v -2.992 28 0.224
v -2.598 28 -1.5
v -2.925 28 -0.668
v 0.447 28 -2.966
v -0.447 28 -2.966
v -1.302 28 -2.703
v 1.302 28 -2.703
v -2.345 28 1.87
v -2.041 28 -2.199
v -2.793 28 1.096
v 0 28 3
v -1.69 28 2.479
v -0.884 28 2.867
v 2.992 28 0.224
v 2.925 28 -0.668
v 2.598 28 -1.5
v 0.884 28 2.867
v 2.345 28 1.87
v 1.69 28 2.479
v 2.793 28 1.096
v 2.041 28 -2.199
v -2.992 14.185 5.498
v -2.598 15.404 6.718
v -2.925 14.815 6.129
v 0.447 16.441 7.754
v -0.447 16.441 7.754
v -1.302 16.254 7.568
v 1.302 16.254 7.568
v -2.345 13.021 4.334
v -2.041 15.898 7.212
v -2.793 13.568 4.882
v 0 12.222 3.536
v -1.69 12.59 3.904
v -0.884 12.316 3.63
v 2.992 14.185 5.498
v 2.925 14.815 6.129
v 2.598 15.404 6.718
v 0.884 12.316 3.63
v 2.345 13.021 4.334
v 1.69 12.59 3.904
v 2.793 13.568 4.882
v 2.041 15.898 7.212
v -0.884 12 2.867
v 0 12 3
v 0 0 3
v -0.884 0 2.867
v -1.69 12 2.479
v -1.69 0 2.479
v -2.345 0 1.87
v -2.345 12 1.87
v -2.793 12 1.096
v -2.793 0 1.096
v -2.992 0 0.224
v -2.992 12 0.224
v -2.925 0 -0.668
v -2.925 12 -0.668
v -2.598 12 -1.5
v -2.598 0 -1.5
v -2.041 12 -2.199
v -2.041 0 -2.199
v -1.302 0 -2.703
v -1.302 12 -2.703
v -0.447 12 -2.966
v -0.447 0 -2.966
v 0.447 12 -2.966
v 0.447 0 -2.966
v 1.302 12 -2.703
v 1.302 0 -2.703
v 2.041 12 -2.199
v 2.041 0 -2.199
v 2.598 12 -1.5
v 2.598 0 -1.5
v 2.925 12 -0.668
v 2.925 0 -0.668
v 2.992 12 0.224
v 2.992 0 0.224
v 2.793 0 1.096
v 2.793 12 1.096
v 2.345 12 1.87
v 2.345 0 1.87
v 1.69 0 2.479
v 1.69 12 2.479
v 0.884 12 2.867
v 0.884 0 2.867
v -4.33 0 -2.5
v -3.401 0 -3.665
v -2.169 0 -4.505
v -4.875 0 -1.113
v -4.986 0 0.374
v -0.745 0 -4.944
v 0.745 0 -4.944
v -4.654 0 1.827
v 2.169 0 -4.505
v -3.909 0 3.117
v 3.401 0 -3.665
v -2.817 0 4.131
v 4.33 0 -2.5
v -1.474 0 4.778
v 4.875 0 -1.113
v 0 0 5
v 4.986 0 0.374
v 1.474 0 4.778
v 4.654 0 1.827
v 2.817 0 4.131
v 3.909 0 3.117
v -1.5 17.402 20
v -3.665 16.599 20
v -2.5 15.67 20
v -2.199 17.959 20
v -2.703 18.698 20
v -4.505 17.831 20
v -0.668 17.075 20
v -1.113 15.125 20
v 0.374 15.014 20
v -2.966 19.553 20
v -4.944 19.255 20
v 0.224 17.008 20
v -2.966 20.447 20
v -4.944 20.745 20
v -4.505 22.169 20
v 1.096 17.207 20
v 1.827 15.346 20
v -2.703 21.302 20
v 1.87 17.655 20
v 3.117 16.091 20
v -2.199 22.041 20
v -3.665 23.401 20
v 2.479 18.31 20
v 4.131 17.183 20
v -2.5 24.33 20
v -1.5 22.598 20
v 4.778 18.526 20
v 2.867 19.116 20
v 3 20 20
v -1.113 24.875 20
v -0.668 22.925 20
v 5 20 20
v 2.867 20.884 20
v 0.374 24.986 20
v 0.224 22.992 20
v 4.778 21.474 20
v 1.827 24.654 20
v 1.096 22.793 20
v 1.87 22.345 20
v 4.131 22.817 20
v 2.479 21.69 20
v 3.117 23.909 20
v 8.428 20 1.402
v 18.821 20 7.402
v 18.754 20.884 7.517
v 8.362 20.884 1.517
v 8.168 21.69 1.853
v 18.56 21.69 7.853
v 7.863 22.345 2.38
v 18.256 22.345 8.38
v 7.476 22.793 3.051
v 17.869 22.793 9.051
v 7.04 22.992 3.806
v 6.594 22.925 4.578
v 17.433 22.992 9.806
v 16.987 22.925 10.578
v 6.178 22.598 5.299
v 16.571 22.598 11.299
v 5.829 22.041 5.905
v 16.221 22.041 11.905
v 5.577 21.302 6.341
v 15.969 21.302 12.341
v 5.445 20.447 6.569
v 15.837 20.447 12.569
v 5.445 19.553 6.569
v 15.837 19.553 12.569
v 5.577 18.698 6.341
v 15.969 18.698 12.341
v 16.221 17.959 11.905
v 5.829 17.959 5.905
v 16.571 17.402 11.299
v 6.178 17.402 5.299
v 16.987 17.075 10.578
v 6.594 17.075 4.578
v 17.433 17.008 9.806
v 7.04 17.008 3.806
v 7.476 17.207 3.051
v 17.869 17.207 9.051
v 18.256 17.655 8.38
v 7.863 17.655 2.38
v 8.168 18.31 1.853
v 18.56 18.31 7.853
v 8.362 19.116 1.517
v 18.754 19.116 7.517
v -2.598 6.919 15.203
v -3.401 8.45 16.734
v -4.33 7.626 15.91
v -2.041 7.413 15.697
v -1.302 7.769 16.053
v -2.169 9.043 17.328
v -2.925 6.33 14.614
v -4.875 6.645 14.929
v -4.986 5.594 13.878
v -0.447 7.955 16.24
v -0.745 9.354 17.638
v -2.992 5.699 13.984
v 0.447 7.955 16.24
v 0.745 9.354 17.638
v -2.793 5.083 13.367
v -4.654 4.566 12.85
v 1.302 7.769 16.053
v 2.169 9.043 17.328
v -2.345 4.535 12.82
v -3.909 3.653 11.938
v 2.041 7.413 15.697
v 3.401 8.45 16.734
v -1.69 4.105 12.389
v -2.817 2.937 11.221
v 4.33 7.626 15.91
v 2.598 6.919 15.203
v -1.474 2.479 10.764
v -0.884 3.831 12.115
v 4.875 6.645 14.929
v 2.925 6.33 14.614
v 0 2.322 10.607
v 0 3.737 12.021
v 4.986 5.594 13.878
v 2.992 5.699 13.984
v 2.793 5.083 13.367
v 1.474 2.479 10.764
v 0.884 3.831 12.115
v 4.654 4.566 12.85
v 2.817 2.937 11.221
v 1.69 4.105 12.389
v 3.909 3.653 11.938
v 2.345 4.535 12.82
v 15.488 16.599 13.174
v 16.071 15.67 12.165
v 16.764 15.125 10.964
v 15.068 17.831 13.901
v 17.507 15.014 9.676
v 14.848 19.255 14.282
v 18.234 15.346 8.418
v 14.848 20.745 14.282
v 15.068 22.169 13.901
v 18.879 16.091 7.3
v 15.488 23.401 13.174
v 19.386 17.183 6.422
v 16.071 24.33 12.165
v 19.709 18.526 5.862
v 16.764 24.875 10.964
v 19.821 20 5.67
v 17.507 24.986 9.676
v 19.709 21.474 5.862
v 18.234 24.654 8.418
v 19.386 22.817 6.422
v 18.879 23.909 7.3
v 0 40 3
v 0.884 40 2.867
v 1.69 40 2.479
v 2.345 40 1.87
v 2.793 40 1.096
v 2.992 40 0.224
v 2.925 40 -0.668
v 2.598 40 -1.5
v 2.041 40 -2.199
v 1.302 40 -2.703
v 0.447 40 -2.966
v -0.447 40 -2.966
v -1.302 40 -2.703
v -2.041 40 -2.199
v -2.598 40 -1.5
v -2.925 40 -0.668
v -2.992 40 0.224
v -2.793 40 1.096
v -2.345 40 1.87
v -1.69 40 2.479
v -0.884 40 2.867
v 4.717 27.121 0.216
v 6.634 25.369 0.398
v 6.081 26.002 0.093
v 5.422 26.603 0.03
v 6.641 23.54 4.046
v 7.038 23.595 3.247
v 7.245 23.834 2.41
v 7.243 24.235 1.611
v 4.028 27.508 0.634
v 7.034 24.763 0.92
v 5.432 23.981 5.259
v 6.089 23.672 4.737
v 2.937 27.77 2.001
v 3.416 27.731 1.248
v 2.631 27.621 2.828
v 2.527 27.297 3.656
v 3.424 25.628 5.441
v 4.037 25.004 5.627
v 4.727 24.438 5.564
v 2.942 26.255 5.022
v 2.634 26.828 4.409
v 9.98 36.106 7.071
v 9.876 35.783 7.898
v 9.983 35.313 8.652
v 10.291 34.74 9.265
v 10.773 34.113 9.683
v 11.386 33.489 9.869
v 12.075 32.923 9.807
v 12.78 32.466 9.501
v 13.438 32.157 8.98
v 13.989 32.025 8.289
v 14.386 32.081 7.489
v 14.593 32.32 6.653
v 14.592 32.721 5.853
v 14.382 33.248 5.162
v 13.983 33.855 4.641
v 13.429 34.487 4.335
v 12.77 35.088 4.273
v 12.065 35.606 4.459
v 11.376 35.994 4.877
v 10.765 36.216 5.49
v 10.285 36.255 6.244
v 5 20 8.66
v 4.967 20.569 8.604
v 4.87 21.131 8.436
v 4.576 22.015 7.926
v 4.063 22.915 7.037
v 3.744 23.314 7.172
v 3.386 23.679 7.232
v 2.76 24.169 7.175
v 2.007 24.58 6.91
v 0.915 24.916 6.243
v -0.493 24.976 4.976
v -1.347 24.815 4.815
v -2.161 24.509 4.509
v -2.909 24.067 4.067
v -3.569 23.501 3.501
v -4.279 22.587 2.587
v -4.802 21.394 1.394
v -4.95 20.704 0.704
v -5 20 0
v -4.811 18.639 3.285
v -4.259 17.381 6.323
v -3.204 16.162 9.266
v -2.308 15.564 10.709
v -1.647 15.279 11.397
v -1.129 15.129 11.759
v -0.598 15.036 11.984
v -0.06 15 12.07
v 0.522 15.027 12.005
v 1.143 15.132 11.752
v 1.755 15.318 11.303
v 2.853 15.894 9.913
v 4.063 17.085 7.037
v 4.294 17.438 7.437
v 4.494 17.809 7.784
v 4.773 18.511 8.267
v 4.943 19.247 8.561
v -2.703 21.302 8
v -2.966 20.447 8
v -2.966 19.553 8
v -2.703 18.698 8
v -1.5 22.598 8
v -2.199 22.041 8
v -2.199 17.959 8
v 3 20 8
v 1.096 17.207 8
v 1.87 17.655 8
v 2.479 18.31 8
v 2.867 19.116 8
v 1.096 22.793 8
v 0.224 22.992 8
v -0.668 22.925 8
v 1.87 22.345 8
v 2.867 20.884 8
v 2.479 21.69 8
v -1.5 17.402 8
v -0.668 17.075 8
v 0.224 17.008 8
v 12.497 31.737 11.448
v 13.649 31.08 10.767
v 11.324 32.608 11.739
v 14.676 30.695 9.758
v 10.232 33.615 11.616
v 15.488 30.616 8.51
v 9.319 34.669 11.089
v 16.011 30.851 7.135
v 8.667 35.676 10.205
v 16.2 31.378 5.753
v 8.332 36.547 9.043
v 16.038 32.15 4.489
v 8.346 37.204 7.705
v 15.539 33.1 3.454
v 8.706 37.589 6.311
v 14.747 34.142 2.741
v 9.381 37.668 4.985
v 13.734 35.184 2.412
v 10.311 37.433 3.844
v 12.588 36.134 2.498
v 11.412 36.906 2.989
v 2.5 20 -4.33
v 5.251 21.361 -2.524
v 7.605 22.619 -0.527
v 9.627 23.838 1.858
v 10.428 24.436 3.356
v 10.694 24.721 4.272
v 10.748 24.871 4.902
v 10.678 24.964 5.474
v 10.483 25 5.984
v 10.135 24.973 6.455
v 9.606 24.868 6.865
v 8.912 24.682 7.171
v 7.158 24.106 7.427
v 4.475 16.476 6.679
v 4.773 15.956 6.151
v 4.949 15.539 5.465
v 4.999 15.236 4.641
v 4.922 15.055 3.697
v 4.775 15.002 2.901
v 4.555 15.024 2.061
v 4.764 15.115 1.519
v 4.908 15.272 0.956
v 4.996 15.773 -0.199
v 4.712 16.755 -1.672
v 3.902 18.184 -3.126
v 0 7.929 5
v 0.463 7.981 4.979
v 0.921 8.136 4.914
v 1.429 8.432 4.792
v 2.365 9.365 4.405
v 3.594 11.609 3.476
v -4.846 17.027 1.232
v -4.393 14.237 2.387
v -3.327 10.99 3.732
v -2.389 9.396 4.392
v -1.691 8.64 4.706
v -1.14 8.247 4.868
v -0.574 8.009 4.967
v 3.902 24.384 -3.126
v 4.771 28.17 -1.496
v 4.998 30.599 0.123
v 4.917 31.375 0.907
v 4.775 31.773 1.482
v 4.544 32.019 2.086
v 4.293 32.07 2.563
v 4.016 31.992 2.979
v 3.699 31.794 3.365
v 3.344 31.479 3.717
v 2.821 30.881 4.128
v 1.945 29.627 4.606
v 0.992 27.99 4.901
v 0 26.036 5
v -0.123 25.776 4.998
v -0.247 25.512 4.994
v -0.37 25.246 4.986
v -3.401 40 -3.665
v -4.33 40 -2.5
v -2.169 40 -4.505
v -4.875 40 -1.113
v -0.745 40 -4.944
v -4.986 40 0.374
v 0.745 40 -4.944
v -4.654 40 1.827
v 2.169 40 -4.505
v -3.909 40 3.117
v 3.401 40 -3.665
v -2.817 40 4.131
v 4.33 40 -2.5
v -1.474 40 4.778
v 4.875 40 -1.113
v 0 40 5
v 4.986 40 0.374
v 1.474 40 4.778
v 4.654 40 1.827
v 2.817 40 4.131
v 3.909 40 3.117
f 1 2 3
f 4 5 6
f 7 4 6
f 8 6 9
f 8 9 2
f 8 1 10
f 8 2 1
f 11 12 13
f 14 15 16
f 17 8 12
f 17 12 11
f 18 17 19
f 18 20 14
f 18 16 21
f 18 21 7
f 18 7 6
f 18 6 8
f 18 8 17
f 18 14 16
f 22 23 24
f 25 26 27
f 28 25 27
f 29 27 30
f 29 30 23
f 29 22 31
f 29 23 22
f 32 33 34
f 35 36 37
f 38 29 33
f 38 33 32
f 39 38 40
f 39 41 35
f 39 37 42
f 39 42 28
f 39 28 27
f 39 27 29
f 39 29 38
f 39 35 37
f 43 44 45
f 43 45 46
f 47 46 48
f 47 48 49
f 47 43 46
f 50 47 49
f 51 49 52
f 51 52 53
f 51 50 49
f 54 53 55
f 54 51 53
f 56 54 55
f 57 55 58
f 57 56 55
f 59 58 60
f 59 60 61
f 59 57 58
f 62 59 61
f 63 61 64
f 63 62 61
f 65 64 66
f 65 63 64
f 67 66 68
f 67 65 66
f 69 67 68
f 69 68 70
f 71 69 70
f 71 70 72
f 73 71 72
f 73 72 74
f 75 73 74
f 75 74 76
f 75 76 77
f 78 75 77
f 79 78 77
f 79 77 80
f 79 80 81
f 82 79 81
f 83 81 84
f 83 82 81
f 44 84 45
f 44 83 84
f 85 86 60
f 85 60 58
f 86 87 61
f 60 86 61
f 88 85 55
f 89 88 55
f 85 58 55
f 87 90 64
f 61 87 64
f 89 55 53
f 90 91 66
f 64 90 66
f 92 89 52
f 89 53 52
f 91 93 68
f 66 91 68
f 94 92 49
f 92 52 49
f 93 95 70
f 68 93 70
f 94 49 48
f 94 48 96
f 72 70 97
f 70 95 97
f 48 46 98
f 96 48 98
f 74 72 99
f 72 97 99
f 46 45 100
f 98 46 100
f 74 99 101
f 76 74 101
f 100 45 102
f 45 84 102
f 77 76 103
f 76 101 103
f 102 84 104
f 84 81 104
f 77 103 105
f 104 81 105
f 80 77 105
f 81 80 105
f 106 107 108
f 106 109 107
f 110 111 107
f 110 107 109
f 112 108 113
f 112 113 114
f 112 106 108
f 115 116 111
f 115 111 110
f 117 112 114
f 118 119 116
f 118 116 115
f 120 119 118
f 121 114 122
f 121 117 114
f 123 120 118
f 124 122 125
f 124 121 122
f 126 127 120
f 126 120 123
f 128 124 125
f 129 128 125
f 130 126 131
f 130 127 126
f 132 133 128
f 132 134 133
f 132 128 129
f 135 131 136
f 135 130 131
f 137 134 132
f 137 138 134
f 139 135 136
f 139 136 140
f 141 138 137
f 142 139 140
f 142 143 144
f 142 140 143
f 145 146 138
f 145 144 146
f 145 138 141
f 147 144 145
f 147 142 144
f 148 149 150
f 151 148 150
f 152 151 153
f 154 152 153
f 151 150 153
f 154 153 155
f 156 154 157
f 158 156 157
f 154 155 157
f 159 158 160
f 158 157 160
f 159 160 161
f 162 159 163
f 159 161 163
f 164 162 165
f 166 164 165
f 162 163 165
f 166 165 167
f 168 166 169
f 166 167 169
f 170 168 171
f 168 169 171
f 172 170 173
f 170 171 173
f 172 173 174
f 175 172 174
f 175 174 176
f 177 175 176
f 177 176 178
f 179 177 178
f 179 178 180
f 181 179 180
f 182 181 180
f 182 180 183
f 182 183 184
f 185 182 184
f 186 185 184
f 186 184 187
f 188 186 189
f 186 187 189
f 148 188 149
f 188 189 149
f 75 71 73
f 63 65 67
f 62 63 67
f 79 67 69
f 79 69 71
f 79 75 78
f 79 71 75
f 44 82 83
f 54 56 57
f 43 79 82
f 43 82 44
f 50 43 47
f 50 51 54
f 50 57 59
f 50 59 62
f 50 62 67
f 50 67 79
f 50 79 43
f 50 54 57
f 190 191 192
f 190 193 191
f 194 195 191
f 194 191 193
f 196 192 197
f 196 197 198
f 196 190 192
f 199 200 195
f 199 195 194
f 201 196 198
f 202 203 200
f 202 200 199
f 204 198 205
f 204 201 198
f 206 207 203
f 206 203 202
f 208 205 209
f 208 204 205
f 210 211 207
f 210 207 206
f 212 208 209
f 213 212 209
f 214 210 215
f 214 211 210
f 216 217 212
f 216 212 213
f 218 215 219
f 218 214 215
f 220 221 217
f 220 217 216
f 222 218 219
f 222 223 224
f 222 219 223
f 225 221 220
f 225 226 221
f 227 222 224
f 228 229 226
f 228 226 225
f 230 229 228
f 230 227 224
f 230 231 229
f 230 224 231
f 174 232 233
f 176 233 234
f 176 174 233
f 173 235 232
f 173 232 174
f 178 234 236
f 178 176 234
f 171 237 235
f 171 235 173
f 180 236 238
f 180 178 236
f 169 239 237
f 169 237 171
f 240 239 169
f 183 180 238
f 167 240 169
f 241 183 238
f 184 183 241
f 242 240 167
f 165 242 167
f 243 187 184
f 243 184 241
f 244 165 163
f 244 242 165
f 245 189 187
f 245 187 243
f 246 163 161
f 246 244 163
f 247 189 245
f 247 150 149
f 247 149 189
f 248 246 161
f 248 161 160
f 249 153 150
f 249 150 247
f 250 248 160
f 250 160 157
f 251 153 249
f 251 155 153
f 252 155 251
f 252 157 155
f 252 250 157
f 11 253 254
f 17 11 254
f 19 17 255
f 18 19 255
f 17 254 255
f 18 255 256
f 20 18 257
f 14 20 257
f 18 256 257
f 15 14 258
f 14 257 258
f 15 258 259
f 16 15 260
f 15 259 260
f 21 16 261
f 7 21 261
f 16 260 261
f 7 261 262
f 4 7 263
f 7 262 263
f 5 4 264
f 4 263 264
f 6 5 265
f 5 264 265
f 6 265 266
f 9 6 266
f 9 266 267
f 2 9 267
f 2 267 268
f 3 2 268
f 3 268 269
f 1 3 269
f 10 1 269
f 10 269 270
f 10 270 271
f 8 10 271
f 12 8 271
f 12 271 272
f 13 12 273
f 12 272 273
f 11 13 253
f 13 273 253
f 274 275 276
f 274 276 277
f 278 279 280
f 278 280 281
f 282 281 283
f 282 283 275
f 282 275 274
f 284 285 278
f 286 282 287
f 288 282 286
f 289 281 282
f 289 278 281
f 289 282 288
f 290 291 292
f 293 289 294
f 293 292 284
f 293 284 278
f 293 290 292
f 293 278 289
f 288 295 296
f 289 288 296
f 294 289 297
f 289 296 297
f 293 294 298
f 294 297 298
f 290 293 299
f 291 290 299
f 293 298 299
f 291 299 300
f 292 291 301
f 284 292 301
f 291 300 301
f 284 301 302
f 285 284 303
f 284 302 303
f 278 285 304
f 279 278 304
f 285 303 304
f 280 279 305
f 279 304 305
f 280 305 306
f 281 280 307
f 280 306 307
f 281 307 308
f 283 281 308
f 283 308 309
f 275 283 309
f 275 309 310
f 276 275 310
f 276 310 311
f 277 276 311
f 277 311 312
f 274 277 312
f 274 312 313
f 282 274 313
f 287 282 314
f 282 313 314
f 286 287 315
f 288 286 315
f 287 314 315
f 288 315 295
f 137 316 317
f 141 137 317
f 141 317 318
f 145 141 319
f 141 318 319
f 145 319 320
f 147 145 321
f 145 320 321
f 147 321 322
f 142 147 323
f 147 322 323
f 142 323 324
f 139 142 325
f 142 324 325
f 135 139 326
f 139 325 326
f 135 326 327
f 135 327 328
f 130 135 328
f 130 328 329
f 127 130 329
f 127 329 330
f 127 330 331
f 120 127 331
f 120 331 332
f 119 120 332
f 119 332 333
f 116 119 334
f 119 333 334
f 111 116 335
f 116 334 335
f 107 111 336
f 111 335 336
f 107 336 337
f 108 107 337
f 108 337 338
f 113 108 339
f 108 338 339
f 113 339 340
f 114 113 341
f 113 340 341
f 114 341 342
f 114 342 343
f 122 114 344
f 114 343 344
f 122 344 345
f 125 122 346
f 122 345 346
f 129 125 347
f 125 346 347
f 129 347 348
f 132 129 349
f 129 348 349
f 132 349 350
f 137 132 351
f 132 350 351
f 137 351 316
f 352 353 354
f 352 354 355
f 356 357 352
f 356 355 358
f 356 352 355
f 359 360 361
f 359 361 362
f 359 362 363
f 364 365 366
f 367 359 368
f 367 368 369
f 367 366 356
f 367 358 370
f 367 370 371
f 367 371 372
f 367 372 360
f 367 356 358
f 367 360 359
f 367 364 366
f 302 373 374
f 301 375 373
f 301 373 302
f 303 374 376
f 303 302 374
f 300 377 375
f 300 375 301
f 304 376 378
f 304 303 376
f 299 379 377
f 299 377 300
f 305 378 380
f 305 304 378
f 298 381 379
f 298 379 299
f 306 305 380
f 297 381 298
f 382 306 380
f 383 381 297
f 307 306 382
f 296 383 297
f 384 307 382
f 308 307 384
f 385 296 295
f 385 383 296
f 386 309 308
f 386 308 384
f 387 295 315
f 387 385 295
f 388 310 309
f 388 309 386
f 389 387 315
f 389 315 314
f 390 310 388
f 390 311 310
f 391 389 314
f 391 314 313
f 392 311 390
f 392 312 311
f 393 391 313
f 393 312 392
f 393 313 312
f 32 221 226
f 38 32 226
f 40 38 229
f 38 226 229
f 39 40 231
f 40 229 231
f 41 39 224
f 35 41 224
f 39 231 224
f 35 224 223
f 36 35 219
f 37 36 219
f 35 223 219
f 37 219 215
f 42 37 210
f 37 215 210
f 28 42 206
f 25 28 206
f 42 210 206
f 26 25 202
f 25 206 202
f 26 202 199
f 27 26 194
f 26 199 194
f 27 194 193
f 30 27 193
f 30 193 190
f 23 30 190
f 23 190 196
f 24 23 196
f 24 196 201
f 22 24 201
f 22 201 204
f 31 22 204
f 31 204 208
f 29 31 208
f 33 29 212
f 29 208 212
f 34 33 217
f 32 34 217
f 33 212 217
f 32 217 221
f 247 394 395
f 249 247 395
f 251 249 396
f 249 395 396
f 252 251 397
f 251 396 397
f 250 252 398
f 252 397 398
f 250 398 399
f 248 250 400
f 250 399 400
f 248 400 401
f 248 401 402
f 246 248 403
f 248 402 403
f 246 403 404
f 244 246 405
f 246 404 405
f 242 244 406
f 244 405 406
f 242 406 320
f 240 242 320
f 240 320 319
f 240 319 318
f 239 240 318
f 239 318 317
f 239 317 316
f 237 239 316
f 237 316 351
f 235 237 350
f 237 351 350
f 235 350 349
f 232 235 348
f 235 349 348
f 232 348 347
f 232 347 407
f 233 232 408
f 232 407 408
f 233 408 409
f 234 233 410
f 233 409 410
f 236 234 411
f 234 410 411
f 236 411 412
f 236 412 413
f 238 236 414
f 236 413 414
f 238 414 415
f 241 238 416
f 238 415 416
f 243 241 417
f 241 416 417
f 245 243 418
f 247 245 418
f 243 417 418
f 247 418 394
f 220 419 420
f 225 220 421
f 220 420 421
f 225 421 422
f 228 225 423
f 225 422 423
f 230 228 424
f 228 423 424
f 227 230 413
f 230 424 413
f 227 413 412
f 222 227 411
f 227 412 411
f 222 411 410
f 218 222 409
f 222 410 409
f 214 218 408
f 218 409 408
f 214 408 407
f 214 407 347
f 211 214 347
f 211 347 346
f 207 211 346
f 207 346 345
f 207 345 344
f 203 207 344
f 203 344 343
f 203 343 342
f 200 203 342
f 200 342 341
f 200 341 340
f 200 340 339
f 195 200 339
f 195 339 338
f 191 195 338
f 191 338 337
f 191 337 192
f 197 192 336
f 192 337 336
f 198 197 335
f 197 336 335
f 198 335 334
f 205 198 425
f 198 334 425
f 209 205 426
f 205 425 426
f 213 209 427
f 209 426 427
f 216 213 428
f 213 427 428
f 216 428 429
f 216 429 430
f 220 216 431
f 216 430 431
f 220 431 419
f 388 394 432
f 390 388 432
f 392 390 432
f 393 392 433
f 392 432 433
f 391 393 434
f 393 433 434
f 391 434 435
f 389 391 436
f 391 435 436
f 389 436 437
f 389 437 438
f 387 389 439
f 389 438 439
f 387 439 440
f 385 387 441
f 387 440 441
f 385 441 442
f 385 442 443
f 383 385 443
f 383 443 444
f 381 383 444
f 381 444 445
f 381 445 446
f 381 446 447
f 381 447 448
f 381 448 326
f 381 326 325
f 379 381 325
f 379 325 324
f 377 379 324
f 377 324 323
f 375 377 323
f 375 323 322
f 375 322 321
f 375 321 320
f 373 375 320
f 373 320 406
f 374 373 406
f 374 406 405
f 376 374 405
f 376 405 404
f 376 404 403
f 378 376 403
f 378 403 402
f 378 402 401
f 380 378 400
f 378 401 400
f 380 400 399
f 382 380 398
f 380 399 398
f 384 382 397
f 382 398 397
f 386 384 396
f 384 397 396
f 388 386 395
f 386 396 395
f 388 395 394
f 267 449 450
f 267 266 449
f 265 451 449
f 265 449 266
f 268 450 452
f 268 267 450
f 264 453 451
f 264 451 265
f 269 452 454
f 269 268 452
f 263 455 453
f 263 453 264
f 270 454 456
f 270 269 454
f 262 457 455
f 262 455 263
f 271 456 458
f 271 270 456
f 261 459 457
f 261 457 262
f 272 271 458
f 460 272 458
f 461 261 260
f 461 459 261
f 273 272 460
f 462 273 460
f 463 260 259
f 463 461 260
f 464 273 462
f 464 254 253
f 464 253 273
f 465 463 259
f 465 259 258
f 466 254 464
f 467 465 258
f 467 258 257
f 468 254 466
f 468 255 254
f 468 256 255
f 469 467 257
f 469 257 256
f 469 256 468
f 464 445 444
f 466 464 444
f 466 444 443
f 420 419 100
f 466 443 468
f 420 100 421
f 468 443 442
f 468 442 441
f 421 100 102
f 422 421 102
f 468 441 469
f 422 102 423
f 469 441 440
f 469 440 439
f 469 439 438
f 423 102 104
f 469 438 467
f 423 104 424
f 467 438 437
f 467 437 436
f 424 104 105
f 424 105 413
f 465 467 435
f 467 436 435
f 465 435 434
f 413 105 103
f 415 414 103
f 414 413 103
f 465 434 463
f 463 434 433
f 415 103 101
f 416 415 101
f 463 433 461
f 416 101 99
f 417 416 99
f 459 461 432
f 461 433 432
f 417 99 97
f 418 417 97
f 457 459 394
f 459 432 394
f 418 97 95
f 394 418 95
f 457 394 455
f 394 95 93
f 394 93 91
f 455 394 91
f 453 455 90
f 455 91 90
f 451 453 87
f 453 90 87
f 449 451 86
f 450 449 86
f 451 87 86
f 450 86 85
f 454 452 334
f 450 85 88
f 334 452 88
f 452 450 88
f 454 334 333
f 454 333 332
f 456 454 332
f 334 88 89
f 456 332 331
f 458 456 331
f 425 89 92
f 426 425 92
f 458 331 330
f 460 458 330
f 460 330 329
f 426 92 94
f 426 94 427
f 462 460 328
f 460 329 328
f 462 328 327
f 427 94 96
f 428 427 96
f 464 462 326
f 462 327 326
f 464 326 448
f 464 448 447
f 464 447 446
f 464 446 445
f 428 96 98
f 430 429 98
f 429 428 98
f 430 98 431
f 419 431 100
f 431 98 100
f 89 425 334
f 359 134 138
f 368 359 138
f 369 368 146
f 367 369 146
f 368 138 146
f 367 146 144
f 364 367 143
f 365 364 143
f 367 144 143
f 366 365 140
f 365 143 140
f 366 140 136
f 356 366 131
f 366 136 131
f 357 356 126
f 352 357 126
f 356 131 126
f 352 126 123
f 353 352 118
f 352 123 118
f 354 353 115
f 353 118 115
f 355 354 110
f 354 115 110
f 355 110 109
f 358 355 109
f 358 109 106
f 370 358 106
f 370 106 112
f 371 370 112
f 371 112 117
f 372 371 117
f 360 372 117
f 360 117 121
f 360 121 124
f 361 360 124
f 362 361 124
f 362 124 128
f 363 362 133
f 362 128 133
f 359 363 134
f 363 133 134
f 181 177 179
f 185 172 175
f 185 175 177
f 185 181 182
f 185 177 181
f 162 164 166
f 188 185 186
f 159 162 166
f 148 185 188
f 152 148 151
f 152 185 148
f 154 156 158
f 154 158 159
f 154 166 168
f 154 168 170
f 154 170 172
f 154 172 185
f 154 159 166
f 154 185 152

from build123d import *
from OCP.BRepAlgoAPI import BRepAlgoAPI_Cut
from OCP.TopTools import TopTools_ListOfShape

# Parameters (mm, degrees)
SKETCH1_R                = 5
BOSS_EXTRUDE1_DEPTH      = 40
SKETCH2_R                = 5
BOSS_EXTRUDE2_DEPTH      = 20
SKETCH4_R                = 5
BOSS_EXTRUDE3_DEPTH      = 20
BOSS_EXTRUDE4_DEPTH      = 10
BOSS_EXTRUDE4_DEPTH_BACK = 13.827204
SKETCH6_R                = 5
SKETCH8_R                = 5
CUT_EXTRUDE1_DEPTH       = 3.827204
SKETCH13_R               = 5
BOSS_EXTRUDE5_DEPTH      = 20
SKETCH14_R               = 3
CUT_EXTRUDE2_DEPTH       = 12
CUT_EXTRUDE3_START       = -12
SKETCH15_R               = 3
CUT_EXTRUDE3_DEPTH       = 12
SKETCH16_R               = 3
CUT_EXTRUDE4_DEPTH       = 12
SKETCH17_R               = 3
CUT_EXTRUDE5_DEPTH       = 12
SKETCH18_R               = 3
CUT_EXTRUDE6_DEPTH       = 12
SKETCH19_R               = 3
CUT_EXTRUDE7_DEPTH       = 12


with BuildPart() as part:
    # Sketch1 → Boss-Extrude1 (new body)
    with BuildSketch(Plane(origin=(0, 0, 0), x_dir=(1, 0, 0), z_dir=(0, 1, 0))):
        with Locations(Location((0, 0, 0), (0, 0, 270))):
            Circle(SKETCH1_R)
    extrude(amount=BOSS_EXTRUDE1_DEPTH)

    # Sketch2 → Boss-Extrude2 (add)
    with BuildSketch(Plane.XY):
        with Locations((0, 20)):
            Circle(SKETCH2_R)
    extrude(amount=BOSS_EXTRUDE2_DEPTH)

    # Sketch4 → Boss-Extrude3 (add)
    with BuildSketch(Plane(origin=(0, 10, -10), x_dir=(-1, 0, 0), z_dir=(0, -0.7071067811865475, 0.7071067811865477))):
        with Locations(Location((0, -14.142135624, 0), (0, 0, 90))):
            Circle(SKETCH4_R)
    extrude(amount=BOSS_EXTRUDE3_DEPTH)

    # Sketch6 → Boss-Extrude4 (add, two sides: drawn at the far end of the back side and taken through both)
    with BuildSketch(Plane(origin=(11.97471023, 0, 6.913602175), x_dir=(0.49999999999999756, 0, -0.86602540378444), z_dir=(0.86602540378444, 0, 0.49999999999999756)).offset(-BOSS_EXTRUDE4_DEPTH_BACK)):
        with Locations((0, 20)):
            Circle(SKETCH6_R)
    extrude(amount=BOSS_EXTRUDE4_DEPTH + BOSS_EXTRUDE4_DEPTH_BACK)

    # Sketch8 → Cut-Extrude1 (cut)
    with BuildSketch(Plane(origin=(20.634964268, 0, 11.913602175), x_dir=(0.49999999999999756, 0, -0.86602540378444), z_dir=(0.86602540378444, 0, 0.49999999999999756))):
        with Locations((0, 20)):
            Circle(SKETCH8_R)
    extrude(amount=-CUT_EXTRUDE1_DEPTH, mode=Mode.SUBTRACT)

    # Sketch13 → Boss-Extrude5 (add)
    with BuildSketch(Plane(origin=(8.660254038, 10, 5), x_dir=(0.7905694150420939, -0.5477225575051677, -0.2738612787525826), z_dir=(0.6123724356957958, 0.7071067811865471, 0.3535533905932725))):
        with Locations(Location((-10.95445115, 8.94427191, 0), (0, 0, 50.768479516))):
            Circle(SKETCH13_R)
    extrude(amount=BOSS_EXTRUDE5_DEPTH)

    # Sketch14 → Cut-Extrude2 (cut)
    with BuildSketch(Plane(origin=(0, 40, 0), x_dir=(1, 0, 0), z_dir=(0, 1, 0))):
        with Locations(Location((0, 0, 0), (0, 0, 270))):
            Circle(SKETCH14_R)
    extrude(amount=-CUT_EXTRUDE2_DEPTH, mode=Mode.SUBTRACT)

    # Sketch15 → Cut-Extrude3 (cut)
    with BuildSketch(Plane.XZ.offset(CUT_EXTRUDE3_START)):
        with Locations(Location((0, 0, 0), (0, 0, 90))):
            Circle(SKETCH15_R)
    extrude(amount=CUT_EXTRUDE3_DEPTH, mode=Mode.SUBTRACT)

    # Sketch16 → Cut-Extrude4 (cut)
    with BuildSketch(Plane(origin=(0, -4.142135624, 4.142135624), x_dir=(1, 0, 0), z_dir=(0, -0.7071067811865476, 0.7071067811865476))):
        with Locations(Location((0, 14.142135624, 0), (0, 0, 270))):
            Circle(SKETCH16_R)
    extrude(amount=-CUT_EXTRUDE4_DEPTH, mode=Mode.SUBTRACT)

    # Sketch17 → Cut-Extrude5 (cut)
    with BuildSketch(Plane.XY.offset(20)):
        with Locations((0, 20)):
            Circle(SKETCH17_R)
    extrude(amount=-CUT_EXTRUDE5_DEPTH, mode=Mode.SUBTRACT)


with BuildPart() as cut_extrude6_tool:
    # Sketch18 → Cut-Extrude6 (new body)
    with BuildSketch(Plane(origin=(17.320508076, 0, 10), x_dir=(0.49999999999999756, 0, -0.86602540378444), z_dir=(0.86602540378444, 0, 0.49999999999999756))):
        with Locations((0, 20)):
            Circle(SKETCH18_R)
    extrude(amount=-CUT_EXTRUDE6_DEPTH)


with BuildPart() as part_1:
    add(part.part)

    # Cut-Extrude6: cut by cut_extrude6_tool, with a tolerance
    cut_extrude6_stock = TopTools_ListOfShape()
    cut_extrude6_stock.Append(part_1.part.wrapped)
    cut_extrude6_tools = TopTools_ListOfShape()
    cut_extrude6_tools.Append(cut_extrude6_tool.part.wrapped)
    cut_extrude6_cut = BRepAlgoAPI_Cut()
    cut_extrude6_cut.SetArguments(cut_extrude6_stock)
    cut_extrude6_cut.SetTools(cut_extrude6_tools)
    cut_extrude6_cut.SetFuzzyValue(0.00001)
    cut_extrude6_cut.Build()
    add(Compound.cast(cut_extrude6_cut.Shape()).solids(), mode=Mode.REPLACE)

    # Sketch19 → Cut-Extrude7 (cut)
    with BuildSketch(Plane(origin=(20.907702752, 24.142135624, 12.071067812), x_dir=(0.7905694150420939, -0.5477225575051676, -0.273861278752583), z_dir=(0.6123724356957958, 0.7071067811865471, 0.35355339059327245))):
        with Locations(Location((-10.95445115, 8.94427191, 0), (0, 0, 162.976133815))):
            Circle(SKETCH19_R)
    extrude(amount=-CUT_EXTRUDE7_DEPTH, mode=Mode.SUBTRACT)


solid = part_1.part
